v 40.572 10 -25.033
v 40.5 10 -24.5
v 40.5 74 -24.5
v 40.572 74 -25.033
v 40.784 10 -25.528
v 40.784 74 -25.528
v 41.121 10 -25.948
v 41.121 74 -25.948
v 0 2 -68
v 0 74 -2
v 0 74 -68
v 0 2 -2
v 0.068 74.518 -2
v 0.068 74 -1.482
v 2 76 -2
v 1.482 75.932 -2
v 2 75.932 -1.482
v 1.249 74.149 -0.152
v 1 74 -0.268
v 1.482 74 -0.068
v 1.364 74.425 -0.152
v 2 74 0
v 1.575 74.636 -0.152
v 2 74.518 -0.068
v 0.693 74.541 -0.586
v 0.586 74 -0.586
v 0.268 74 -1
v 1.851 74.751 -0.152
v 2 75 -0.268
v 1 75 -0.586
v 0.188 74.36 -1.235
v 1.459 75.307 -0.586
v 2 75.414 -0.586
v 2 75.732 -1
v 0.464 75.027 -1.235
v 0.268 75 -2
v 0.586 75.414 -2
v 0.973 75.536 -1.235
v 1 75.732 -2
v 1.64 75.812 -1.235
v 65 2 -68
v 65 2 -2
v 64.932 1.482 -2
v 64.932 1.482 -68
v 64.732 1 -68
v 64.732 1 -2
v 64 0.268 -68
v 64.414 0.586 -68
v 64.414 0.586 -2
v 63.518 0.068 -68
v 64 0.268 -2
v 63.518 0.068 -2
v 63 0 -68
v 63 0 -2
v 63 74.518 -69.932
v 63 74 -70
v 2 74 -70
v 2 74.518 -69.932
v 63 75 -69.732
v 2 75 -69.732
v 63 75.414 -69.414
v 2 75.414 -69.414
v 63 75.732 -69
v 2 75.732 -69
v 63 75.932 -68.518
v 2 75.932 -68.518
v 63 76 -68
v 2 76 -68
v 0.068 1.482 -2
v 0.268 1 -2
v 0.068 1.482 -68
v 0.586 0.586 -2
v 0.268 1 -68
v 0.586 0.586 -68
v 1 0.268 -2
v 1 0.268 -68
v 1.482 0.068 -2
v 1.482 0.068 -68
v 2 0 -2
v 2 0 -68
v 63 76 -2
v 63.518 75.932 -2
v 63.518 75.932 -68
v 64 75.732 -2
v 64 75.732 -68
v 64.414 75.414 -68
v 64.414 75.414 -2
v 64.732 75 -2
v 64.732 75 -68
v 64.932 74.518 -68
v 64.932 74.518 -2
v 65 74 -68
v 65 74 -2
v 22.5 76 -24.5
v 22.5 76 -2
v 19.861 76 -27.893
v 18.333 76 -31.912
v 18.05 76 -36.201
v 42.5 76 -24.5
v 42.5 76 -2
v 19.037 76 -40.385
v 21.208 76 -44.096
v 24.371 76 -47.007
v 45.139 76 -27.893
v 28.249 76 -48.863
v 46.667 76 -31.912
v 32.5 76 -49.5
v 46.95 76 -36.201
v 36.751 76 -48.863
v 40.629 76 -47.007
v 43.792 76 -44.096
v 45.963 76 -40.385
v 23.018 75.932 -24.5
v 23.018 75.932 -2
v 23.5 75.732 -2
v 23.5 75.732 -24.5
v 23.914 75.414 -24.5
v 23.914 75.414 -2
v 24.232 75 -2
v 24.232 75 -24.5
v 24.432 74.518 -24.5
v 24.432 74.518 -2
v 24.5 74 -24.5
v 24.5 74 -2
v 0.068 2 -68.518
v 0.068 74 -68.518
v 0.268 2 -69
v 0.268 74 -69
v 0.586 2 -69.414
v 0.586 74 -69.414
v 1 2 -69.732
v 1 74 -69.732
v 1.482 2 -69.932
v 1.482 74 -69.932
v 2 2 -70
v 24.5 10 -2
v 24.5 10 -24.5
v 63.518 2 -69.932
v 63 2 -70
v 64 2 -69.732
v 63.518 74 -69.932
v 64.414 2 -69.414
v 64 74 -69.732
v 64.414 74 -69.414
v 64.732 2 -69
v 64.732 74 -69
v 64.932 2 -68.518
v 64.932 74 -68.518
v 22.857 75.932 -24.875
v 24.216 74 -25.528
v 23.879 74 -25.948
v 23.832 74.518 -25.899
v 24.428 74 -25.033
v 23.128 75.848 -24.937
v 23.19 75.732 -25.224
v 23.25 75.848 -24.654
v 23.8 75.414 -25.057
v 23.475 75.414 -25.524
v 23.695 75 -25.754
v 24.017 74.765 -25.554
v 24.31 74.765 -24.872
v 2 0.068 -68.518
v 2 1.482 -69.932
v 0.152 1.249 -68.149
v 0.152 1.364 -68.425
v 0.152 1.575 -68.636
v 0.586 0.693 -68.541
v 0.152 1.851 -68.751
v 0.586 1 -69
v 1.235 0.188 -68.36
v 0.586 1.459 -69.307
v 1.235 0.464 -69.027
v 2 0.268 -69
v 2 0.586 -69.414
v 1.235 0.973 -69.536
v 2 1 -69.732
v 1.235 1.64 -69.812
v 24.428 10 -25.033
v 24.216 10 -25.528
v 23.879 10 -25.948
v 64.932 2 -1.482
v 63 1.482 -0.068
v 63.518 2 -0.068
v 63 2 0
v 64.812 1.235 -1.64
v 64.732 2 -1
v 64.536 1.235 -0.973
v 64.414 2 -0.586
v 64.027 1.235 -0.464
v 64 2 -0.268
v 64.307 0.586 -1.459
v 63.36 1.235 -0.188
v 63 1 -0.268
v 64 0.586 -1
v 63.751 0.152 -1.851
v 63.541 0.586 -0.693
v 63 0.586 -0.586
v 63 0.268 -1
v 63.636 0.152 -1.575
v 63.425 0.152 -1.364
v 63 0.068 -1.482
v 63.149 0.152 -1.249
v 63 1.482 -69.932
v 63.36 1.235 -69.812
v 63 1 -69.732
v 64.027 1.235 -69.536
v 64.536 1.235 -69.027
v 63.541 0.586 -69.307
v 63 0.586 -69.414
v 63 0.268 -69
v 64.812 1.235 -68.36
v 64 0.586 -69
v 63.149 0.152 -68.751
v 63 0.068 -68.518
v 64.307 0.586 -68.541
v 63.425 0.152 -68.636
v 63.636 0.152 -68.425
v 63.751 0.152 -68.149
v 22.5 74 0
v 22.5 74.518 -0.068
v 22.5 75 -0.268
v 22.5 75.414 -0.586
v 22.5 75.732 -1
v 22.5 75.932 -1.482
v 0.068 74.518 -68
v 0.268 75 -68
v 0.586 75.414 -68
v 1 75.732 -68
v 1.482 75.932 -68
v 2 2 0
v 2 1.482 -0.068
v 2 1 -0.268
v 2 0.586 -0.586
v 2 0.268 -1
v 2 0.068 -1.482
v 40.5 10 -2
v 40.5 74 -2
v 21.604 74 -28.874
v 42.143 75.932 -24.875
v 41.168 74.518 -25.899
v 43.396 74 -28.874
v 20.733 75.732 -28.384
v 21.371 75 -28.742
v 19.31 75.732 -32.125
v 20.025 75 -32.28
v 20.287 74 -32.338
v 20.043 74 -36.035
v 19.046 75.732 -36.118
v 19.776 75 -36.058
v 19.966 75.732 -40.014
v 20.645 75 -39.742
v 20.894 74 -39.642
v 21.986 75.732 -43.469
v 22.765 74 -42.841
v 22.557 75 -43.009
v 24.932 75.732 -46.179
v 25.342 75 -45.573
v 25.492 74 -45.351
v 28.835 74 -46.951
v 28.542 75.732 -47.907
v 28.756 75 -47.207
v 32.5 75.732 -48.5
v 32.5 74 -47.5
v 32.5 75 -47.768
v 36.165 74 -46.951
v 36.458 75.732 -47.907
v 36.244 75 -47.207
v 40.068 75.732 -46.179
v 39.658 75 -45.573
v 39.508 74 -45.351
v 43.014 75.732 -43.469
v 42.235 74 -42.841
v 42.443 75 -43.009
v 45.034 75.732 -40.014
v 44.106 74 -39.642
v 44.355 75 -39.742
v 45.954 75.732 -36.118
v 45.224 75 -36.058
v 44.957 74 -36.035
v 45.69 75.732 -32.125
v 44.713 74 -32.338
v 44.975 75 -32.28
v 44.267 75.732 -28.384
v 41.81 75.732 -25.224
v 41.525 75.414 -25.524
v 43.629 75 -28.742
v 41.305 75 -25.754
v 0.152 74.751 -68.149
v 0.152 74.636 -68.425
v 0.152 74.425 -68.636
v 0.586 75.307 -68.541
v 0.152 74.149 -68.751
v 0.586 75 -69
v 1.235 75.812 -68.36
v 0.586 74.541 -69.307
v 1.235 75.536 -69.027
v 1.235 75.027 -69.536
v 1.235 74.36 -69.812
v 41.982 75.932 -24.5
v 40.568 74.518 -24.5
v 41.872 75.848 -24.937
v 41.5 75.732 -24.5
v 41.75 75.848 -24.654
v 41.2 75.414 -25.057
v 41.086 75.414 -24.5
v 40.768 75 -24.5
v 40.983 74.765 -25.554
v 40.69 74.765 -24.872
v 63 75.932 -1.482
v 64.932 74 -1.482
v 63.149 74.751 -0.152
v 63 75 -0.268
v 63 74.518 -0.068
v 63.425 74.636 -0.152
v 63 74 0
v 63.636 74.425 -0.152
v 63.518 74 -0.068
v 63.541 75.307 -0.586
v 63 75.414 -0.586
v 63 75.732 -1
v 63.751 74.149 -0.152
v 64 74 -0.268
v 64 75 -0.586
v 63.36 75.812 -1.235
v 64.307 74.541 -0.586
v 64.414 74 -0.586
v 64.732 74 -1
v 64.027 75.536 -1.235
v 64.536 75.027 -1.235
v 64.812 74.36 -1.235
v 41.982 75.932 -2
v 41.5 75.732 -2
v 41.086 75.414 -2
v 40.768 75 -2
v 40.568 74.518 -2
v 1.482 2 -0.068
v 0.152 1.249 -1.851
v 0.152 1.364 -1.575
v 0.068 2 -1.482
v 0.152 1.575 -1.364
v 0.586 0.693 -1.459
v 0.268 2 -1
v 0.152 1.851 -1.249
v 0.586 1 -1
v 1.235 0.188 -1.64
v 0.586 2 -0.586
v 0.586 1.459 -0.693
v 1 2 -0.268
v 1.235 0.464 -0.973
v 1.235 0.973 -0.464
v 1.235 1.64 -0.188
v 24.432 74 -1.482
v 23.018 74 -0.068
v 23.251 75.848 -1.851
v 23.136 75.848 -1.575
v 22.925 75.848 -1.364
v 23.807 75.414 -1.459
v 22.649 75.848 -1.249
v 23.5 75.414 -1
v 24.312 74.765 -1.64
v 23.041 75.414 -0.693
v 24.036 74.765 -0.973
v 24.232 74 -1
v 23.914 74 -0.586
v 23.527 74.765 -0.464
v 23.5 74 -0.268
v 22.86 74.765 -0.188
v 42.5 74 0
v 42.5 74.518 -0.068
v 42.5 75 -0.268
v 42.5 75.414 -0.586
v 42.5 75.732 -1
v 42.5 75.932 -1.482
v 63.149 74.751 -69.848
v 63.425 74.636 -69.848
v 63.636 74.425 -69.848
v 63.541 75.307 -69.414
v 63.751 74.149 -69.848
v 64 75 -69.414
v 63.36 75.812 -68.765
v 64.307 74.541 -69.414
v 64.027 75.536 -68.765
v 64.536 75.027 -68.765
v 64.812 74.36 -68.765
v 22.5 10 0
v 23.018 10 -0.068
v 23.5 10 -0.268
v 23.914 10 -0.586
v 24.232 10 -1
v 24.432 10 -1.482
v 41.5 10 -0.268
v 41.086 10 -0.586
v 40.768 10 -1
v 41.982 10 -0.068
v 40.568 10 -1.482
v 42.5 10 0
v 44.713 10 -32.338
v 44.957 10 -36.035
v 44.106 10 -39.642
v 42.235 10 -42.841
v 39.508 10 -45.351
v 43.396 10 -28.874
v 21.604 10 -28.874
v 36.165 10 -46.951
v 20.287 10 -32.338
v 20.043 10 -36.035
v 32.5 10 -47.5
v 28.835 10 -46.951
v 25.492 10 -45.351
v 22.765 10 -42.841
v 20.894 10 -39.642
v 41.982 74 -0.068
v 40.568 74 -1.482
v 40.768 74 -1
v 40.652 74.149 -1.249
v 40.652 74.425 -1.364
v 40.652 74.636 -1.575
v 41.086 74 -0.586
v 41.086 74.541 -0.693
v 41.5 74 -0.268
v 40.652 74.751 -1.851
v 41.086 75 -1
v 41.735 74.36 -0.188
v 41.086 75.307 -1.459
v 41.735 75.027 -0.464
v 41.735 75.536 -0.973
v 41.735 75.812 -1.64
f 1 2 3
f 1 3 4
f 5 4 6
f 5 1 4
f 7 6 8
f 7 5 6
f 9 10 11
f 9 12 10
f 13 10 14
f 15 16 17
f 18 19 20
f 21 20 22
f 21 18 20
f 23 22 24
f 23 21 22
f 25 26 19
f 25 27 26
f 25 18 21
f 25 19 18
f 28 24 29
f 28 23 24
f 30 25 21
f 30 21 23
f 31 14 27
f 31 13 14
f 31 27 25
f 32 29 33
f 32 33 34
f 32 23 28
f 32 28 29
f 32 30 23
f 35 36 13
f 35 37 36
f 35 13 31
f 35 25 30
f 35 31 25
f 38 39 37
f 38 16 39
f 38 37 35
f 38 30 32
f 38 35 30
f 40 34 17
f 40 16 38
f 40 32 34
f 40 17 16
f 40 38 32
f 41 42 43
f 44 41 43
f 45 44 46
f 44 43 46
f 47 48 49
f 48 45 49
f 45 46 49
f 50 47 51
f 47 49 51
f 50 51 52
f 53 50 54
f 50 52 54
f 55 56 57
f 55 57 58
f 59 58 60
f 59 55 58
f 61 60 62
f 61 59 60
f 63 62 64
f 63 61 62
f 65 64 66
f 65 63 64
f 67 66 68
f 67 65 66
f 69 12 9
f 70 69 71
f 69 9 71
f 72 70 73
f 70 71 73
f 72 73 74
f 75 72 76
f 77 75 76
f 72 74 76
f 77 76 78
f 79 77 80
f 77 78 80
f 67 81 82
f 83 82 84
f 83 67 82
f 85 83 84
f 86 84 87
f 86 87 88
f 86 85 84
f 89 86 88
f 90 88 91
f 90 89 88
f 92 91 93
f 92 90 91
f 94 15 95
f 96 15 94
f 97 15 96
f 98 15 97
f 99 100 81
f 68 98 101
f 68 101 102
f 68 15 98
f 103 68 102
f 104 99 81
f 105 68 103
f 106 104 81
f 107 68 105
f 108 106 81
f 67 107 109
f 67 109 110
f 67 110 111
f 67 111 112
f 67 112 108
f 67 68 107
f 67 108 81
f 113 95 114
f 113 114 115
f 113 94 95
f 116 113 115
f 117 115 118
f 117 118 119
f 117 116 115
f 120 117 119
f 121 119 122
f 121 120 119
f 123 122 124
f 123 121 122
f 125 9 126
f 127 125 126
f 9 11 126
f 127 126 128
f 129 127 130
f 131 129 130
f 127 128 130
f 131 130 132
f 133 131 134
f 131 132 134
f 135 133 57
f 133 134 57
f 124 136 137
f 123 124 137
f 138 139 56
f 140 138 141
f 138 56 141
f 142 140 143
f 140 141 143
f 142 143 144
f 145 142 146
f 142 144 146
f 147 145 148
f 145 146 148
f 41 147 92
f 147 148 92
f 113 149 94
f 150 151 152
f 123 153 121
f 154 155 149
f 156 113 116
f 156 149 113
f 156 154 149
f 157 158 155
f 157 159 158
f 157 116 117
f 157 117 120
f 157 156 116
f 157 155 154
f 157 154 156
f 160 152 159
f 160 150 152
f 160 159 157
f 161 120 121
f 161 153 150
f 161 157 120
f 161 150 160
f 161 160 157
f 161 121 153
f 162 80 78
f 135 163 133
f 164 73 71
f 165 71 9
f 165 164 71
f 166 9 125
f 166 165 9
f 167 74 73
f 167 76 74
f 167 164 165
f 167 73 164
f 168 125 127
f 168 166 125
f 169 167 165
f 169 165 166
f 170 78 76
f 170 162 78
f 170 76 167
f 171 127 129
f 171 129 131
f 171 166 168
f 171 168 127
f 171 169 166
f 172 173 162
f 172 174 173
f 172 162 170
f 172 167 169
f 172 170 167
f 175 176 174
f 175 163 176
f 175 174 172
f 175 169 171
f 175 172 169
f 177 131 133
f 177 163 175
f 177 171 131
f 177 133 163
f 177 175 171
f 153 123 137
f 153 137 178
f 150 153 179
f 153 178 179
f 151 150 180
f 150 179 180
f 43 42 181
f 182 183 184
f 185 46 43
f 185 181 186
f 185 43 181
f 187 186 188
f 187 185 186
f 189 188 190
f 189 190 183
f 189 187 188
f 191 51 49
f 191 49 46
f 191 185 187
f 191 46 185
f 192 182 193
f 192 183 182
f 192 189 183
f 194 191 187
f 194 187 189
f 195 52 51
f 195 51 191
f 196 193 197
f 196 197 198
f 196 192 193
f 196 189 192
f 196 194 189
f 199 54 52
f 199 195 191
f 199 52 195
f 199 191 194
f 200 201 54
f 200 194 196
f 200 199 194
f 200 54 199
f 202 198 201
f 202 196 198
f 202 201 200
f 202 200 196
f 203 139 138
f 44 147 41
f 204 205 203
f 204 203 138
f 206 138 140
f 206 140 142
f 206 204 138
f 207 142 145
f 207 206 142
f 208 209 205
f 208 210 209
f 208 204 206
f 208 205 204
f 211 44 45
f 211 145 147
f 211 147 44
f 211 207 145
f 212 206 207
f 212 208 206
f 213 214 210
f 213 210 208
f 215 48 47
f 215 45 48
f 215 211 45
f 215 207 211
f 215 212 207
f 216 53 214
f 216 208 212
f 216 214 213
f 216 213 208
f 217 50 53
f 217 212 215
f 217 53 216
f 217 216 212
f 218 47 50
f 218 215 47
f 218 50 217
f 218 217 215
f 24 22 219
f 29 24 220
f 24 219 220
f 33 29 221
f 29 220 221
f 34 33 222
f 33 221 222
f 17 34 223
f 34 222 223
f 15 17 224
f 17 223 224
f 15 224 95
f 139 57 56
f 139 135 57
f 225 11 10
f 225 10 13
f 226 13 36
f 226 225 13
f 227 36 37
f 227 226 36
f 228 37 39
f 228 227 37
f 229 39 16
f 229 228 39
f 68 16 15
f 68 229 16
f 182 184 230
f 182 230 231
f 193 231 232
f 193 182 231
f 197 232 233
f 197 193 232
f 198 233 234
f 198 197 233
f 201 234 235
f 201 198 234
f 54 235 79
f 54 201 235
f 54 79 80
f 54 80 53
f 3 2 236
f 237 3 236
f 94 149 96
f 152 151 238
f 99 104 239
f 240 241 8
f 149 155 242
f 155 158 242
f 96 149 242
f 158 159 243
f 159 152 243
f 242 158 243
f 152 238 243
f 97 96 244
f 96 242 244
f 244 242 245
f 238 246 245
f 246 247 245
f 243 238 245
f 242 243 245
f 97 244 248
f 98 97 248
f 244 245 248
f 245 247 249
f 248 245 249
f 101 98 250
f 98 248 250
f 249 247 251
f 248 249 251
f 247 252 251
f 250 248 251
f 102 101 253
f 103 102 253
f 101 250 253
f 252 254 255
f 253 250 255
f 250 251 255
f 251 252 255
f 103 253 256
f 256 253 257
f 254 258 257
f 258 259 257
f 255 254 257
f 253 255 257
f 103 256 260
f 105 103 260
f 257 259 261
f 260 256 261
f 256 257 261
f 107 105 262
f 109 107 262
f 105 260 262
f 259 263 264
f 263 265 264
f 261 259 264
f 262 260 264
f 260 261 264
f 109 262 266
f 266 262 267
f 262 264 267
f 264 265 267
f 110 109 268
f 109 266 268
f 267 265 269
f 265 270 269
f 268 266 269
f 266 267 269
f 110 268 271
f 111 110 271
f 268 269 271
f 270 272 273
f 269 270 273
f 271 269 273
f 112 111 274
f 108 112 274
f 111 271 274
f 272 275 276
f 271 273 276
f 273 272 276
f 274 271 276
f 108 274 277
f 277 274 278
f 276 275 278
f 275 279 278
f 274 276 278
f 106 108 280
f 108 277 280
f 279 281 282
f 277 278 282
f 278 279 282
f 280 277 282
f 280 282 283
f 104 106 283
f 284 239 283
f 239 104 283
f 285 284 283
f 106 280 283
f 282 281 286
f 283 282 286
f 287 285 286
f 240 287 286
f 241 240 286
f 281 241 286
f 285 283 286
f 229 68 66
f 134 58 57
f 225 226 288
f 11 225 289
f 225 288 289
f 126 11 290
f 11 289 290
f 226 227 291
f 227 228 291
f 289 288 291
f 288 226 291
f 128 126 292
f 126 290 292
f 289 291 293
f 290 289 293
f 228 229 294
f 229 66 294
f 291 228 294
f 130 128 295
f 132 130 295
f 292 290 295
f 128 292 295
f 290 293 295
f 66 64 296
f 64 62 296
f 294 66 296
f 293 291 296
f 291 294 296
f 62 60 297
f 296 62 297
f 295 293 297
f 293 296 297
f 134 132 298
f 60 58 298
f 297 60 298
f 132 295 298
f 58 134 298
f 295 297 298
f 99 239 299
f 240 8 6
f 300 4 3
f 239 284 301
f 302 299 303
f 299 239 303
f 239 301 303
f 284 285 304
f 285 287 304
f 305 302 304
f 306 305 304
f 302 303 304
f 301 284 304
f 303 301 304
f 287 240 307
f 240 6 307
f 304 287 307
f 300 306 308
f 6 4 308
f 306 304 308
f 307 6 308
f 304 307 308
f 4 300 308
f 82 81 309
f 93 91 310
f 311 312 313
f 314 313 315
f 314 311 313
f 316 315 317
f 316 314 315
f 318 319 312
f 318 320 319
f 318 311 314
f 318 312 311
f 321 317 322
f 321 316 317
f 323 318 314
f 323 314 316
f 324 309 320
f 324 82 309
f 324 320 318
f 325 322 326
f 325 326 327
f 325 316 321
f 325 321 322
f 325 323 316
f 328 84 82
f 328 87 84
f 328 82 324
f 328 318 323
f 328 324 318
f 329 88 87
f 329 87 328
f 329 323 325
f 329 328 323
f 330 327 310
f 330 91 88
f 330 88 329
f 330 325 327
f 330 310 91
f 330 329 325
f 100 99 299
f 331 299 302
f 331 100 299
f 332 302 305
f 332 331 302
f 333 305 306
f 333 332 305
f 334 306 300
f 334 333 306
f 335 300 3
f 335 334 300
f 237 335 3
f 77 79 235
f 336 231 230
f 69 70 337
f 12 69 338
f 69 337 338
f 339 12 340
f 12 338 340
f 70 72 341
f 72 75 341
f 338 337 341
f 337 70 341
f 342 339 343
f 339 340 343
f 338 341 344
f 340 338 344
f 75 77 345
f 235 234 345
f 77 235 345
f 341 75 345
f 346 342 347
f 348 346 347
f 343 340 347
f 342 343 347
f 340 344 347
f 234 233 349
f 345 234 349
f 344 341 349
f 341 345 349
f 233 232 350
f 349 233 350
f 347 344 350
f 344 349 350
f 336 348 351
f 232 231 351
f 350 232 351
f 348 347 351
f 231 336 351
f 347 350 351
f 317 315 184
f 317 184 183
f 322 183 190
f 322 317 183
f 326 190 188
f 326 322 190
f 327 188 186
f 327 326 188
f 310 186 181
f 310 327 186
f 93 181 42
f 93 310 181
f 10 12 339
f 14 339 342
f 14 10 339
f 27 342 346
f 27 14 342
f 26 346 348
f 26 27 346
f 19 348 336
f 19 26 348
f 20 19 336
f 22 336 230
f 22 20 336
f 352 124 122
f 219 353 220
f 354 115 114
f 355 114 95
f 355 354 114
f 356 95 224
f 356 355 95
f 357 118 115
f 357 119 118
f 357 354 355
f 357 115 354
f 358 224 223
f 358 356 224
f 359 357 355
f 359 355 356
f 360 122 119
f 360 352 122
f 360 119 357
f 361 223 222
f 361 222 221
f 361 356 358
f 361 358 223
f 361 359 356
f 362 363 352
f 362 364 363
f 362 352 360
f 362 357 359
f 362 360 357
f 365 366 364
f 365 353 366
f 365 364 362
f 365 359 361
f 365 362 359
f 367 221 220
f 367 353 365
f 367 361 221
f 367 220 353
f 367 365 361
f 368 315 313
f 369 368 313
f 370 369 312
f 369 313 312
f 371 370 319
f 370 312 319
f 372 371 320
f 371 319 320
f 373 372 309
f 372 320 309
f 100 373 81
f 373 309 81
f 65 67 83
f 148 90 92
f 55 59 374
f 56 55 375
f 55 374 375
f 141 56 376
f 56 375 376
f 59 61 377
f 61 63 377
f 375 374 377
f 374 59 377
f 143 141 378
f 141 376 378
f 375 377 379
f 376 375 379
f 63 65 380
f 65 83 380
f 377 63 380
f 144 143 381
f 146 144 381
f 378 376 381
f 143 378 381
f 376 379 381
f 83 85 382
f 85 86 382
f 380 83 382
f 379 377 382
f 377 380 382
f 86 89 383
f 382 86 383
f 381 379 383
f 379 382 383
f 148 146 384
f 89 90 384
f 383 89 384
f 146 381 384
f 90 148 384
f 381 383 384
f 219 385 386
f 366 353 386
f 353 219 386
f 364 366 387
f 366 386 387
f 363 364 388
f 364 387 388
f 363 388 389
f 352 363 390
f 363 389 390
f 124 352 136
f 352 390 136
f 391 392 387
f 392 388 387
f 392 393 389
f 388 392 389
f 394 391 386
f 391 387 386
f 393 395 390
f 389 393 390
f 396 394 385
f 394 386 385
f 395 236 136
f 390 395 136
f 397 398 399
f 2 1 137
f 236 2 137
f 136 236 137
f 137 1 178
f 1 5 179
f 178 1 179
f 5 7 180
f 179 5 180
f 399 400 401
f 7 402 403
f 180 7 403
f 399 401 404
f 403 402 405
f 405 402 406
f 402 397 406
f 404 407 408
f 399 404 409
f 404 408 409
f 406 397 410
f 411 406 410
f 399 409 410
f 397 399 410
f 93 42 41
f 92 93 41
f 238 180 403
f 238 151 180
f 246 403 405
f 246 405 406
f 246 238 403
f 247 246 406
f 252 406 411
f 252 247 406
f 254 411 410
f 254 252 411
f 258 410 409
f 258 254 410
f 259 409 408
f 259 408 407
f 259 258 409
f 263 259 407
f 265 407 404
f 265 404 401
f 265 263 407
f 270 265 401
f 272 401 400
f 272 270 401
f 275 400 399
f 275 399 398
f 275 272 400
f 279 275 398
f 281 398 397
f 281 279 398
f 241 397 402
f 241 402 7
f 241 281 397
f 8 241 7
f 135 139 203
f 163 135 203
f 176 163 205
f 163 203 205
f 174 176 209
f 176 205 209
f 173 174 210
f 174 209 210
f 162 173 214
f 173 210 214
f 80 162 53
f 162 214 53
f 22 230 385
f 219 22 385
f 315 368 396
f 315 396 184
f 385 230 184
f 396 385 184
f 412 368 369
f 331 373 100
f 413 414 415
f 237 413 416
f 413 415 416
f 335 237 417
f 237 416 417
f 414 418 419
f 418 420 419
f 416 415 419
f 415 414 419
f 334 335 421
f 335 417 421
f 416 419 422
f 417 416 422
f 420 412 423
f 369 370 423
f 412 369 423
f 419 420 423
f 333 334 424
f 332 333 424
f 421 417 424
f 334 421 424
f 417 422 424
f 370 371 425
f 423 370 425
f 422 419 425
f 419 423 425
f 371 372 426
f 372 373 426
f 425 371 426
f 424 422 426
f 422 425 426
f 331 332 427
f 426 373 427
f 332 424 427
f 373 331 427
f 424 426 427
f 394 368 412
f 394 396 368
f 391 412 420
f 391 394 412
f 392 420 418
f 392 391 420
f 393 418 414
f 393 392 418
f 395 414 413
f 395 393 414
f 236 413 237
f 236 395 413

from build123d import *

# Parameters (mm, degrees)
SKETCH1_W           = 65
SKETCH1_H           = 70
BOSS_EXTRUDE1_DEPTH = 76
CUT_EXTRUDE1_DEPTH  = 66
FILLET1_R           = 2
FILLET2_R           = 2


with BuildPart() as part:
    # Sketch1 → Boss-Extrude1 (new body)
    with BuildSketch(Plane(origin=(0, 0, 0), x_dir=(1, 0, 0), z_dir=(0, 1, 0))):
        with Locations((32.5, 35)):
            Rectangle(SKETCH1_W, SKETCH1_H)
    extrude(amount=BOSS_EXTRUDE1_DEPTH)

    # Sketch2 → Cut-Extrude1 (cut)
    with BuildSketch(Plane(origin=(0, 76, 0), x_dir=(1, 0, 0), z_dir=(0, 1, 0))):
        with BuildLine():
            Line((24.5, 0), (24.5, 25.395313644))
            ThreePointArc((24.5, 25.395313644), (32.5, 47.5), (40.5, 25.395313644))
            Line((40.5, 25.395313644), (40.5, 0))
            Line((40.5, 0), (24.5, 0))
        make_face()
    extrude(amount=-CUT_EXTRUDE1_DEPTH, mode=Mode.SUBTRACT)

    # Fillet1
    fillet1_edges = [part.edges().sort_by_distance(p)[0] for p in [
        (65, 76, -35),
        (52.75, 76, 0),
        (32.5, 76, -70),
        (24.5, 43, -25.395313644),
        (40.5, 43, -25.395313644),
        (40.5, 43, 0),
        (24.5, 43, 0),
        (32.5, 76, -47.5),
        (24.5, 76, -12.697656822),
        (40.5, 76, -12.697656822),
        (0, 76, -35),
        (32.5, 0, -70),
        (32.5, 0, 0),
        (0, 0, -35),
        (0, 38, -70),
        (65, 38, -70),
        (65, 38, 0),
        (0, 38, 0),
        (12.25, 76, 0),
    ]]
    fillet(fillet1_edges, radius=FILLET1_R)

    # Fillet2
    # the kernel refuses this fillet: 2 mm, written as the material it takes off along each edge
    with BuildSketch(Plane(origin=(63, 2, -68), x_dir=(1, 0, 0), z_dir=(0, -1, 0))) as fillet2_piece_1_section:
        Polygon((0, 0), (FILLET2_R, 0), (FILLET2_R, -FILLET2_R), (0, -FILLET2_R), align=None)
    fillet2_piece_1 = extrude(amount=FILLET2_R, mode=Mode.PRIVATE)
    fillet2_piece_1 = fillet2_piece_1 - Plane(origin=(63, 2, -68), x_dir=(-0.7071067811865475, 0, 0.7071067811865475), z_dir=(0, -1, 0)) * Sphere(FILLET2_R, mode=Mode.PRIVATE)
    add(fillet2_piece_1, mode=Mode.SUBTRACT)
    with BuildSketch(Plane(origin=(63, 2, -2), x_dir=(1, 0, 0), z_dir=(0, -1, 0))) as fillet2_piece_2_section:
        Polygon((0, 0), (FILLET2_R, 0), (FILLET2_R, FILLET2_R), (0, FILLET2_R), align=None)
    fillet2_piece_2 = extrude(amount=FILLET2_R, mode=Mode.PRIVATE)
    fillet2_piece_2 = fillet2_piece_2 - Plane(origin=(63, 2, -2), x_dir=(-0.7071067811865475, 0, -0.7071067811865475), z_dir=(0, -1, 0)) * Sphere(FILLET2_R, mode=Mode.PRIVATE)
    add(fillet2_piece_2, mode=Mode.SUBTRACT)
    with BuildSketch(Plane(origin=(65, 0, -2), x_dir=(-1, 0, 0), z_dir=(0, 0, -1))) as fillet2_piece_3:
        with BuildLine():
            CenterArc((FILLET2_R, FILLET2_R), FILLET2_R, 180, 90)
            Line((0, FILLET2_R), (0, 0))
            Line((0, 0), (FILLET2_R, 0))
        make_face()
    extrude(amount=66, mode=Mode.SUBTRACT)


solid = part.part
